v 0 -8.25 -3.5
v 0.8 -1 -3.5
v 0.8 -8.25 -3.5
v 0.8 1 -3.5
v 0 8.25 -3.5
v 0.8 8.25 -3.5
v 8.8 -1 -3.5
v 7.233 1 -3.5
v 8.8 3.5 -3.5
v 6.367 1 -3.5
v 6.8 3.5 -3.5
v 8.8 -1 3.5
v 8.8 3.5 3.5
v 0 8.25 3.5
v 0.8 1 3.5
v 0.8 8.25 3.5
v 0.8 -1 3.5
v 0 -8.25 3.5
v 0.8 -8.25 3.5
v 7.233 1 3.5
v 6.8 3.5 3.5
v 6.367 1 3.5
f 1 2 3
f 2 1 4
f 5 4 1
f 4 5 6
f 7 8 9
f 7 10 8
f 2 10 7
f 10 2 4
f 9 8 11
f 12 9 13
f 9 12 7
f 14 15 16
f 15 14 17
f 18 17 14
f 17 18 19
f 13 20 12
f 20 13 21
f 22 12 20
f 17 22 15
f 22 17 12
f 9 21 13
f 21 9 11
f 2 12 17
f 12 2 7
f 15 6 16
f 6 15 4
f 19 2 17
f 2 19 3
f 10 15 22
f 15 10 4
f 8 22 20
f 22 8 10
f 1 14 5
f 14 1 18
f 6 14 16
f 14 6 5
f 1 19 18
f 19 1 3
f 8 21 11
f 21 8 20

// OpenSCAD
hook_level=3;//[1:6]
plane_hight=0.8;
hook_width_x=7;
hook_width_y=2;
hOsn=plane_hight*1;
dL=hook_width_y*1;
rotate([0,90,0])
difference(){
union(){
translate([0,4.5/2-dL/2,8+hOsn-dL/2])
cube([hook_width_x,4.5,dL], center=true);
translate([0,0,4+hOsn])
cube([hook_width_x,dL,8], center=true);
translate([0,0,hOsn/2])    
cube([hook_width_x,11*1.5,hOsn], center=true);
}
//уголок немного спиливаем
translate([0,dL/2+((4.5-dL)/1.5)/2,8+hOsn-dL])
scale([1,1,hook_level/10])
rotate([90,0,90])
cylinder(r=(4.5-dL)/1.5,h=hook_width_x+0.2,$fn=3, center=true);
}
